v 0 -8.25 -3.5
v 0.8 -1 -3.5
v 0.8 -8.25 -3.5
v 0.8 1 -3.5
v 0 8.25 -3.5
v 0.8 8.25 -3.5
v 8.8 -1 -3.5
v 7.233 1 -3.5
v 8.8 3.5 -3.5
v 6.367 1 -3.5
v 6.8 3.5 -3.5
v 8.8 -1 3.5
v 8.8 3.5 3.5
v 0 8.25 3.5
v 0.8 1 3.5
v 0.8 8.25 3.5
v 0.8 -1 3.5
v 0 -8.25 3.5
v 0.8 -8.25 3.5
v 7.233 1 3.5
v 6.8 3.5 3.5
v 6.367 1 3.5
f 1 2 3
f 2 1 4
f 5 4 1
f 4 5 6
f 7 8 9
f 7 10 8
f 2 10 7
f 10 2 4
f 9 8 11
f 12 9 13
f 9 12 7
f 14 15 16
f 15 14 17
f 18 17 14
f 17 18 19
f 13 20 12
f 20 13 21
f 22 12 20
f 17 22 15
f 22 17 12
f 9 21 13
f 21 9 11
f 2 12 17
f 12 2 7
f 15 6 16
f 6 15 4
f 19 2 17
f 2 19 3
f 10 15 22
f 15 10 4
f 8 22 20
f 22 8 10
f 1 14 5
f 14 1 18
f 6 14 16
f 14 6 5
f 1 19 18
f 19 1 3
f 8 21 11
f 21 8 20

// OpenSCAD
hook_level=3;//[1:6]
plane_hight=0.8;
hook_width_x=7;
hook_width_y=2;
hOsn=plane_hight*1;
dL=hook_width_y*1;
rotate([0,90,0])
difference(){
union(){
translate([0,4.5/2-dL/2,8+hOsn-dL/2])
cube([hook_width_x,4.5,dL], center=true);
translate([0,0,4+hOsn])
cube([hook_width_x,dL,8], center=true);
translate([0,0,hOsn/2])    
cube([hook_width_x,11*1.5,hOsn], center=true);
}
//уголок немного спиливаем
translate([0,dL/2+((4.5-dL)/1.5)/2,8+hOsn-dL])
scale([1,1,hook_level/10])
rotate([90,0,90])
cylinder(r=(4.5-dL)/1.5,h=hook_width_x+0.2,$fn=3, center=true);
}
